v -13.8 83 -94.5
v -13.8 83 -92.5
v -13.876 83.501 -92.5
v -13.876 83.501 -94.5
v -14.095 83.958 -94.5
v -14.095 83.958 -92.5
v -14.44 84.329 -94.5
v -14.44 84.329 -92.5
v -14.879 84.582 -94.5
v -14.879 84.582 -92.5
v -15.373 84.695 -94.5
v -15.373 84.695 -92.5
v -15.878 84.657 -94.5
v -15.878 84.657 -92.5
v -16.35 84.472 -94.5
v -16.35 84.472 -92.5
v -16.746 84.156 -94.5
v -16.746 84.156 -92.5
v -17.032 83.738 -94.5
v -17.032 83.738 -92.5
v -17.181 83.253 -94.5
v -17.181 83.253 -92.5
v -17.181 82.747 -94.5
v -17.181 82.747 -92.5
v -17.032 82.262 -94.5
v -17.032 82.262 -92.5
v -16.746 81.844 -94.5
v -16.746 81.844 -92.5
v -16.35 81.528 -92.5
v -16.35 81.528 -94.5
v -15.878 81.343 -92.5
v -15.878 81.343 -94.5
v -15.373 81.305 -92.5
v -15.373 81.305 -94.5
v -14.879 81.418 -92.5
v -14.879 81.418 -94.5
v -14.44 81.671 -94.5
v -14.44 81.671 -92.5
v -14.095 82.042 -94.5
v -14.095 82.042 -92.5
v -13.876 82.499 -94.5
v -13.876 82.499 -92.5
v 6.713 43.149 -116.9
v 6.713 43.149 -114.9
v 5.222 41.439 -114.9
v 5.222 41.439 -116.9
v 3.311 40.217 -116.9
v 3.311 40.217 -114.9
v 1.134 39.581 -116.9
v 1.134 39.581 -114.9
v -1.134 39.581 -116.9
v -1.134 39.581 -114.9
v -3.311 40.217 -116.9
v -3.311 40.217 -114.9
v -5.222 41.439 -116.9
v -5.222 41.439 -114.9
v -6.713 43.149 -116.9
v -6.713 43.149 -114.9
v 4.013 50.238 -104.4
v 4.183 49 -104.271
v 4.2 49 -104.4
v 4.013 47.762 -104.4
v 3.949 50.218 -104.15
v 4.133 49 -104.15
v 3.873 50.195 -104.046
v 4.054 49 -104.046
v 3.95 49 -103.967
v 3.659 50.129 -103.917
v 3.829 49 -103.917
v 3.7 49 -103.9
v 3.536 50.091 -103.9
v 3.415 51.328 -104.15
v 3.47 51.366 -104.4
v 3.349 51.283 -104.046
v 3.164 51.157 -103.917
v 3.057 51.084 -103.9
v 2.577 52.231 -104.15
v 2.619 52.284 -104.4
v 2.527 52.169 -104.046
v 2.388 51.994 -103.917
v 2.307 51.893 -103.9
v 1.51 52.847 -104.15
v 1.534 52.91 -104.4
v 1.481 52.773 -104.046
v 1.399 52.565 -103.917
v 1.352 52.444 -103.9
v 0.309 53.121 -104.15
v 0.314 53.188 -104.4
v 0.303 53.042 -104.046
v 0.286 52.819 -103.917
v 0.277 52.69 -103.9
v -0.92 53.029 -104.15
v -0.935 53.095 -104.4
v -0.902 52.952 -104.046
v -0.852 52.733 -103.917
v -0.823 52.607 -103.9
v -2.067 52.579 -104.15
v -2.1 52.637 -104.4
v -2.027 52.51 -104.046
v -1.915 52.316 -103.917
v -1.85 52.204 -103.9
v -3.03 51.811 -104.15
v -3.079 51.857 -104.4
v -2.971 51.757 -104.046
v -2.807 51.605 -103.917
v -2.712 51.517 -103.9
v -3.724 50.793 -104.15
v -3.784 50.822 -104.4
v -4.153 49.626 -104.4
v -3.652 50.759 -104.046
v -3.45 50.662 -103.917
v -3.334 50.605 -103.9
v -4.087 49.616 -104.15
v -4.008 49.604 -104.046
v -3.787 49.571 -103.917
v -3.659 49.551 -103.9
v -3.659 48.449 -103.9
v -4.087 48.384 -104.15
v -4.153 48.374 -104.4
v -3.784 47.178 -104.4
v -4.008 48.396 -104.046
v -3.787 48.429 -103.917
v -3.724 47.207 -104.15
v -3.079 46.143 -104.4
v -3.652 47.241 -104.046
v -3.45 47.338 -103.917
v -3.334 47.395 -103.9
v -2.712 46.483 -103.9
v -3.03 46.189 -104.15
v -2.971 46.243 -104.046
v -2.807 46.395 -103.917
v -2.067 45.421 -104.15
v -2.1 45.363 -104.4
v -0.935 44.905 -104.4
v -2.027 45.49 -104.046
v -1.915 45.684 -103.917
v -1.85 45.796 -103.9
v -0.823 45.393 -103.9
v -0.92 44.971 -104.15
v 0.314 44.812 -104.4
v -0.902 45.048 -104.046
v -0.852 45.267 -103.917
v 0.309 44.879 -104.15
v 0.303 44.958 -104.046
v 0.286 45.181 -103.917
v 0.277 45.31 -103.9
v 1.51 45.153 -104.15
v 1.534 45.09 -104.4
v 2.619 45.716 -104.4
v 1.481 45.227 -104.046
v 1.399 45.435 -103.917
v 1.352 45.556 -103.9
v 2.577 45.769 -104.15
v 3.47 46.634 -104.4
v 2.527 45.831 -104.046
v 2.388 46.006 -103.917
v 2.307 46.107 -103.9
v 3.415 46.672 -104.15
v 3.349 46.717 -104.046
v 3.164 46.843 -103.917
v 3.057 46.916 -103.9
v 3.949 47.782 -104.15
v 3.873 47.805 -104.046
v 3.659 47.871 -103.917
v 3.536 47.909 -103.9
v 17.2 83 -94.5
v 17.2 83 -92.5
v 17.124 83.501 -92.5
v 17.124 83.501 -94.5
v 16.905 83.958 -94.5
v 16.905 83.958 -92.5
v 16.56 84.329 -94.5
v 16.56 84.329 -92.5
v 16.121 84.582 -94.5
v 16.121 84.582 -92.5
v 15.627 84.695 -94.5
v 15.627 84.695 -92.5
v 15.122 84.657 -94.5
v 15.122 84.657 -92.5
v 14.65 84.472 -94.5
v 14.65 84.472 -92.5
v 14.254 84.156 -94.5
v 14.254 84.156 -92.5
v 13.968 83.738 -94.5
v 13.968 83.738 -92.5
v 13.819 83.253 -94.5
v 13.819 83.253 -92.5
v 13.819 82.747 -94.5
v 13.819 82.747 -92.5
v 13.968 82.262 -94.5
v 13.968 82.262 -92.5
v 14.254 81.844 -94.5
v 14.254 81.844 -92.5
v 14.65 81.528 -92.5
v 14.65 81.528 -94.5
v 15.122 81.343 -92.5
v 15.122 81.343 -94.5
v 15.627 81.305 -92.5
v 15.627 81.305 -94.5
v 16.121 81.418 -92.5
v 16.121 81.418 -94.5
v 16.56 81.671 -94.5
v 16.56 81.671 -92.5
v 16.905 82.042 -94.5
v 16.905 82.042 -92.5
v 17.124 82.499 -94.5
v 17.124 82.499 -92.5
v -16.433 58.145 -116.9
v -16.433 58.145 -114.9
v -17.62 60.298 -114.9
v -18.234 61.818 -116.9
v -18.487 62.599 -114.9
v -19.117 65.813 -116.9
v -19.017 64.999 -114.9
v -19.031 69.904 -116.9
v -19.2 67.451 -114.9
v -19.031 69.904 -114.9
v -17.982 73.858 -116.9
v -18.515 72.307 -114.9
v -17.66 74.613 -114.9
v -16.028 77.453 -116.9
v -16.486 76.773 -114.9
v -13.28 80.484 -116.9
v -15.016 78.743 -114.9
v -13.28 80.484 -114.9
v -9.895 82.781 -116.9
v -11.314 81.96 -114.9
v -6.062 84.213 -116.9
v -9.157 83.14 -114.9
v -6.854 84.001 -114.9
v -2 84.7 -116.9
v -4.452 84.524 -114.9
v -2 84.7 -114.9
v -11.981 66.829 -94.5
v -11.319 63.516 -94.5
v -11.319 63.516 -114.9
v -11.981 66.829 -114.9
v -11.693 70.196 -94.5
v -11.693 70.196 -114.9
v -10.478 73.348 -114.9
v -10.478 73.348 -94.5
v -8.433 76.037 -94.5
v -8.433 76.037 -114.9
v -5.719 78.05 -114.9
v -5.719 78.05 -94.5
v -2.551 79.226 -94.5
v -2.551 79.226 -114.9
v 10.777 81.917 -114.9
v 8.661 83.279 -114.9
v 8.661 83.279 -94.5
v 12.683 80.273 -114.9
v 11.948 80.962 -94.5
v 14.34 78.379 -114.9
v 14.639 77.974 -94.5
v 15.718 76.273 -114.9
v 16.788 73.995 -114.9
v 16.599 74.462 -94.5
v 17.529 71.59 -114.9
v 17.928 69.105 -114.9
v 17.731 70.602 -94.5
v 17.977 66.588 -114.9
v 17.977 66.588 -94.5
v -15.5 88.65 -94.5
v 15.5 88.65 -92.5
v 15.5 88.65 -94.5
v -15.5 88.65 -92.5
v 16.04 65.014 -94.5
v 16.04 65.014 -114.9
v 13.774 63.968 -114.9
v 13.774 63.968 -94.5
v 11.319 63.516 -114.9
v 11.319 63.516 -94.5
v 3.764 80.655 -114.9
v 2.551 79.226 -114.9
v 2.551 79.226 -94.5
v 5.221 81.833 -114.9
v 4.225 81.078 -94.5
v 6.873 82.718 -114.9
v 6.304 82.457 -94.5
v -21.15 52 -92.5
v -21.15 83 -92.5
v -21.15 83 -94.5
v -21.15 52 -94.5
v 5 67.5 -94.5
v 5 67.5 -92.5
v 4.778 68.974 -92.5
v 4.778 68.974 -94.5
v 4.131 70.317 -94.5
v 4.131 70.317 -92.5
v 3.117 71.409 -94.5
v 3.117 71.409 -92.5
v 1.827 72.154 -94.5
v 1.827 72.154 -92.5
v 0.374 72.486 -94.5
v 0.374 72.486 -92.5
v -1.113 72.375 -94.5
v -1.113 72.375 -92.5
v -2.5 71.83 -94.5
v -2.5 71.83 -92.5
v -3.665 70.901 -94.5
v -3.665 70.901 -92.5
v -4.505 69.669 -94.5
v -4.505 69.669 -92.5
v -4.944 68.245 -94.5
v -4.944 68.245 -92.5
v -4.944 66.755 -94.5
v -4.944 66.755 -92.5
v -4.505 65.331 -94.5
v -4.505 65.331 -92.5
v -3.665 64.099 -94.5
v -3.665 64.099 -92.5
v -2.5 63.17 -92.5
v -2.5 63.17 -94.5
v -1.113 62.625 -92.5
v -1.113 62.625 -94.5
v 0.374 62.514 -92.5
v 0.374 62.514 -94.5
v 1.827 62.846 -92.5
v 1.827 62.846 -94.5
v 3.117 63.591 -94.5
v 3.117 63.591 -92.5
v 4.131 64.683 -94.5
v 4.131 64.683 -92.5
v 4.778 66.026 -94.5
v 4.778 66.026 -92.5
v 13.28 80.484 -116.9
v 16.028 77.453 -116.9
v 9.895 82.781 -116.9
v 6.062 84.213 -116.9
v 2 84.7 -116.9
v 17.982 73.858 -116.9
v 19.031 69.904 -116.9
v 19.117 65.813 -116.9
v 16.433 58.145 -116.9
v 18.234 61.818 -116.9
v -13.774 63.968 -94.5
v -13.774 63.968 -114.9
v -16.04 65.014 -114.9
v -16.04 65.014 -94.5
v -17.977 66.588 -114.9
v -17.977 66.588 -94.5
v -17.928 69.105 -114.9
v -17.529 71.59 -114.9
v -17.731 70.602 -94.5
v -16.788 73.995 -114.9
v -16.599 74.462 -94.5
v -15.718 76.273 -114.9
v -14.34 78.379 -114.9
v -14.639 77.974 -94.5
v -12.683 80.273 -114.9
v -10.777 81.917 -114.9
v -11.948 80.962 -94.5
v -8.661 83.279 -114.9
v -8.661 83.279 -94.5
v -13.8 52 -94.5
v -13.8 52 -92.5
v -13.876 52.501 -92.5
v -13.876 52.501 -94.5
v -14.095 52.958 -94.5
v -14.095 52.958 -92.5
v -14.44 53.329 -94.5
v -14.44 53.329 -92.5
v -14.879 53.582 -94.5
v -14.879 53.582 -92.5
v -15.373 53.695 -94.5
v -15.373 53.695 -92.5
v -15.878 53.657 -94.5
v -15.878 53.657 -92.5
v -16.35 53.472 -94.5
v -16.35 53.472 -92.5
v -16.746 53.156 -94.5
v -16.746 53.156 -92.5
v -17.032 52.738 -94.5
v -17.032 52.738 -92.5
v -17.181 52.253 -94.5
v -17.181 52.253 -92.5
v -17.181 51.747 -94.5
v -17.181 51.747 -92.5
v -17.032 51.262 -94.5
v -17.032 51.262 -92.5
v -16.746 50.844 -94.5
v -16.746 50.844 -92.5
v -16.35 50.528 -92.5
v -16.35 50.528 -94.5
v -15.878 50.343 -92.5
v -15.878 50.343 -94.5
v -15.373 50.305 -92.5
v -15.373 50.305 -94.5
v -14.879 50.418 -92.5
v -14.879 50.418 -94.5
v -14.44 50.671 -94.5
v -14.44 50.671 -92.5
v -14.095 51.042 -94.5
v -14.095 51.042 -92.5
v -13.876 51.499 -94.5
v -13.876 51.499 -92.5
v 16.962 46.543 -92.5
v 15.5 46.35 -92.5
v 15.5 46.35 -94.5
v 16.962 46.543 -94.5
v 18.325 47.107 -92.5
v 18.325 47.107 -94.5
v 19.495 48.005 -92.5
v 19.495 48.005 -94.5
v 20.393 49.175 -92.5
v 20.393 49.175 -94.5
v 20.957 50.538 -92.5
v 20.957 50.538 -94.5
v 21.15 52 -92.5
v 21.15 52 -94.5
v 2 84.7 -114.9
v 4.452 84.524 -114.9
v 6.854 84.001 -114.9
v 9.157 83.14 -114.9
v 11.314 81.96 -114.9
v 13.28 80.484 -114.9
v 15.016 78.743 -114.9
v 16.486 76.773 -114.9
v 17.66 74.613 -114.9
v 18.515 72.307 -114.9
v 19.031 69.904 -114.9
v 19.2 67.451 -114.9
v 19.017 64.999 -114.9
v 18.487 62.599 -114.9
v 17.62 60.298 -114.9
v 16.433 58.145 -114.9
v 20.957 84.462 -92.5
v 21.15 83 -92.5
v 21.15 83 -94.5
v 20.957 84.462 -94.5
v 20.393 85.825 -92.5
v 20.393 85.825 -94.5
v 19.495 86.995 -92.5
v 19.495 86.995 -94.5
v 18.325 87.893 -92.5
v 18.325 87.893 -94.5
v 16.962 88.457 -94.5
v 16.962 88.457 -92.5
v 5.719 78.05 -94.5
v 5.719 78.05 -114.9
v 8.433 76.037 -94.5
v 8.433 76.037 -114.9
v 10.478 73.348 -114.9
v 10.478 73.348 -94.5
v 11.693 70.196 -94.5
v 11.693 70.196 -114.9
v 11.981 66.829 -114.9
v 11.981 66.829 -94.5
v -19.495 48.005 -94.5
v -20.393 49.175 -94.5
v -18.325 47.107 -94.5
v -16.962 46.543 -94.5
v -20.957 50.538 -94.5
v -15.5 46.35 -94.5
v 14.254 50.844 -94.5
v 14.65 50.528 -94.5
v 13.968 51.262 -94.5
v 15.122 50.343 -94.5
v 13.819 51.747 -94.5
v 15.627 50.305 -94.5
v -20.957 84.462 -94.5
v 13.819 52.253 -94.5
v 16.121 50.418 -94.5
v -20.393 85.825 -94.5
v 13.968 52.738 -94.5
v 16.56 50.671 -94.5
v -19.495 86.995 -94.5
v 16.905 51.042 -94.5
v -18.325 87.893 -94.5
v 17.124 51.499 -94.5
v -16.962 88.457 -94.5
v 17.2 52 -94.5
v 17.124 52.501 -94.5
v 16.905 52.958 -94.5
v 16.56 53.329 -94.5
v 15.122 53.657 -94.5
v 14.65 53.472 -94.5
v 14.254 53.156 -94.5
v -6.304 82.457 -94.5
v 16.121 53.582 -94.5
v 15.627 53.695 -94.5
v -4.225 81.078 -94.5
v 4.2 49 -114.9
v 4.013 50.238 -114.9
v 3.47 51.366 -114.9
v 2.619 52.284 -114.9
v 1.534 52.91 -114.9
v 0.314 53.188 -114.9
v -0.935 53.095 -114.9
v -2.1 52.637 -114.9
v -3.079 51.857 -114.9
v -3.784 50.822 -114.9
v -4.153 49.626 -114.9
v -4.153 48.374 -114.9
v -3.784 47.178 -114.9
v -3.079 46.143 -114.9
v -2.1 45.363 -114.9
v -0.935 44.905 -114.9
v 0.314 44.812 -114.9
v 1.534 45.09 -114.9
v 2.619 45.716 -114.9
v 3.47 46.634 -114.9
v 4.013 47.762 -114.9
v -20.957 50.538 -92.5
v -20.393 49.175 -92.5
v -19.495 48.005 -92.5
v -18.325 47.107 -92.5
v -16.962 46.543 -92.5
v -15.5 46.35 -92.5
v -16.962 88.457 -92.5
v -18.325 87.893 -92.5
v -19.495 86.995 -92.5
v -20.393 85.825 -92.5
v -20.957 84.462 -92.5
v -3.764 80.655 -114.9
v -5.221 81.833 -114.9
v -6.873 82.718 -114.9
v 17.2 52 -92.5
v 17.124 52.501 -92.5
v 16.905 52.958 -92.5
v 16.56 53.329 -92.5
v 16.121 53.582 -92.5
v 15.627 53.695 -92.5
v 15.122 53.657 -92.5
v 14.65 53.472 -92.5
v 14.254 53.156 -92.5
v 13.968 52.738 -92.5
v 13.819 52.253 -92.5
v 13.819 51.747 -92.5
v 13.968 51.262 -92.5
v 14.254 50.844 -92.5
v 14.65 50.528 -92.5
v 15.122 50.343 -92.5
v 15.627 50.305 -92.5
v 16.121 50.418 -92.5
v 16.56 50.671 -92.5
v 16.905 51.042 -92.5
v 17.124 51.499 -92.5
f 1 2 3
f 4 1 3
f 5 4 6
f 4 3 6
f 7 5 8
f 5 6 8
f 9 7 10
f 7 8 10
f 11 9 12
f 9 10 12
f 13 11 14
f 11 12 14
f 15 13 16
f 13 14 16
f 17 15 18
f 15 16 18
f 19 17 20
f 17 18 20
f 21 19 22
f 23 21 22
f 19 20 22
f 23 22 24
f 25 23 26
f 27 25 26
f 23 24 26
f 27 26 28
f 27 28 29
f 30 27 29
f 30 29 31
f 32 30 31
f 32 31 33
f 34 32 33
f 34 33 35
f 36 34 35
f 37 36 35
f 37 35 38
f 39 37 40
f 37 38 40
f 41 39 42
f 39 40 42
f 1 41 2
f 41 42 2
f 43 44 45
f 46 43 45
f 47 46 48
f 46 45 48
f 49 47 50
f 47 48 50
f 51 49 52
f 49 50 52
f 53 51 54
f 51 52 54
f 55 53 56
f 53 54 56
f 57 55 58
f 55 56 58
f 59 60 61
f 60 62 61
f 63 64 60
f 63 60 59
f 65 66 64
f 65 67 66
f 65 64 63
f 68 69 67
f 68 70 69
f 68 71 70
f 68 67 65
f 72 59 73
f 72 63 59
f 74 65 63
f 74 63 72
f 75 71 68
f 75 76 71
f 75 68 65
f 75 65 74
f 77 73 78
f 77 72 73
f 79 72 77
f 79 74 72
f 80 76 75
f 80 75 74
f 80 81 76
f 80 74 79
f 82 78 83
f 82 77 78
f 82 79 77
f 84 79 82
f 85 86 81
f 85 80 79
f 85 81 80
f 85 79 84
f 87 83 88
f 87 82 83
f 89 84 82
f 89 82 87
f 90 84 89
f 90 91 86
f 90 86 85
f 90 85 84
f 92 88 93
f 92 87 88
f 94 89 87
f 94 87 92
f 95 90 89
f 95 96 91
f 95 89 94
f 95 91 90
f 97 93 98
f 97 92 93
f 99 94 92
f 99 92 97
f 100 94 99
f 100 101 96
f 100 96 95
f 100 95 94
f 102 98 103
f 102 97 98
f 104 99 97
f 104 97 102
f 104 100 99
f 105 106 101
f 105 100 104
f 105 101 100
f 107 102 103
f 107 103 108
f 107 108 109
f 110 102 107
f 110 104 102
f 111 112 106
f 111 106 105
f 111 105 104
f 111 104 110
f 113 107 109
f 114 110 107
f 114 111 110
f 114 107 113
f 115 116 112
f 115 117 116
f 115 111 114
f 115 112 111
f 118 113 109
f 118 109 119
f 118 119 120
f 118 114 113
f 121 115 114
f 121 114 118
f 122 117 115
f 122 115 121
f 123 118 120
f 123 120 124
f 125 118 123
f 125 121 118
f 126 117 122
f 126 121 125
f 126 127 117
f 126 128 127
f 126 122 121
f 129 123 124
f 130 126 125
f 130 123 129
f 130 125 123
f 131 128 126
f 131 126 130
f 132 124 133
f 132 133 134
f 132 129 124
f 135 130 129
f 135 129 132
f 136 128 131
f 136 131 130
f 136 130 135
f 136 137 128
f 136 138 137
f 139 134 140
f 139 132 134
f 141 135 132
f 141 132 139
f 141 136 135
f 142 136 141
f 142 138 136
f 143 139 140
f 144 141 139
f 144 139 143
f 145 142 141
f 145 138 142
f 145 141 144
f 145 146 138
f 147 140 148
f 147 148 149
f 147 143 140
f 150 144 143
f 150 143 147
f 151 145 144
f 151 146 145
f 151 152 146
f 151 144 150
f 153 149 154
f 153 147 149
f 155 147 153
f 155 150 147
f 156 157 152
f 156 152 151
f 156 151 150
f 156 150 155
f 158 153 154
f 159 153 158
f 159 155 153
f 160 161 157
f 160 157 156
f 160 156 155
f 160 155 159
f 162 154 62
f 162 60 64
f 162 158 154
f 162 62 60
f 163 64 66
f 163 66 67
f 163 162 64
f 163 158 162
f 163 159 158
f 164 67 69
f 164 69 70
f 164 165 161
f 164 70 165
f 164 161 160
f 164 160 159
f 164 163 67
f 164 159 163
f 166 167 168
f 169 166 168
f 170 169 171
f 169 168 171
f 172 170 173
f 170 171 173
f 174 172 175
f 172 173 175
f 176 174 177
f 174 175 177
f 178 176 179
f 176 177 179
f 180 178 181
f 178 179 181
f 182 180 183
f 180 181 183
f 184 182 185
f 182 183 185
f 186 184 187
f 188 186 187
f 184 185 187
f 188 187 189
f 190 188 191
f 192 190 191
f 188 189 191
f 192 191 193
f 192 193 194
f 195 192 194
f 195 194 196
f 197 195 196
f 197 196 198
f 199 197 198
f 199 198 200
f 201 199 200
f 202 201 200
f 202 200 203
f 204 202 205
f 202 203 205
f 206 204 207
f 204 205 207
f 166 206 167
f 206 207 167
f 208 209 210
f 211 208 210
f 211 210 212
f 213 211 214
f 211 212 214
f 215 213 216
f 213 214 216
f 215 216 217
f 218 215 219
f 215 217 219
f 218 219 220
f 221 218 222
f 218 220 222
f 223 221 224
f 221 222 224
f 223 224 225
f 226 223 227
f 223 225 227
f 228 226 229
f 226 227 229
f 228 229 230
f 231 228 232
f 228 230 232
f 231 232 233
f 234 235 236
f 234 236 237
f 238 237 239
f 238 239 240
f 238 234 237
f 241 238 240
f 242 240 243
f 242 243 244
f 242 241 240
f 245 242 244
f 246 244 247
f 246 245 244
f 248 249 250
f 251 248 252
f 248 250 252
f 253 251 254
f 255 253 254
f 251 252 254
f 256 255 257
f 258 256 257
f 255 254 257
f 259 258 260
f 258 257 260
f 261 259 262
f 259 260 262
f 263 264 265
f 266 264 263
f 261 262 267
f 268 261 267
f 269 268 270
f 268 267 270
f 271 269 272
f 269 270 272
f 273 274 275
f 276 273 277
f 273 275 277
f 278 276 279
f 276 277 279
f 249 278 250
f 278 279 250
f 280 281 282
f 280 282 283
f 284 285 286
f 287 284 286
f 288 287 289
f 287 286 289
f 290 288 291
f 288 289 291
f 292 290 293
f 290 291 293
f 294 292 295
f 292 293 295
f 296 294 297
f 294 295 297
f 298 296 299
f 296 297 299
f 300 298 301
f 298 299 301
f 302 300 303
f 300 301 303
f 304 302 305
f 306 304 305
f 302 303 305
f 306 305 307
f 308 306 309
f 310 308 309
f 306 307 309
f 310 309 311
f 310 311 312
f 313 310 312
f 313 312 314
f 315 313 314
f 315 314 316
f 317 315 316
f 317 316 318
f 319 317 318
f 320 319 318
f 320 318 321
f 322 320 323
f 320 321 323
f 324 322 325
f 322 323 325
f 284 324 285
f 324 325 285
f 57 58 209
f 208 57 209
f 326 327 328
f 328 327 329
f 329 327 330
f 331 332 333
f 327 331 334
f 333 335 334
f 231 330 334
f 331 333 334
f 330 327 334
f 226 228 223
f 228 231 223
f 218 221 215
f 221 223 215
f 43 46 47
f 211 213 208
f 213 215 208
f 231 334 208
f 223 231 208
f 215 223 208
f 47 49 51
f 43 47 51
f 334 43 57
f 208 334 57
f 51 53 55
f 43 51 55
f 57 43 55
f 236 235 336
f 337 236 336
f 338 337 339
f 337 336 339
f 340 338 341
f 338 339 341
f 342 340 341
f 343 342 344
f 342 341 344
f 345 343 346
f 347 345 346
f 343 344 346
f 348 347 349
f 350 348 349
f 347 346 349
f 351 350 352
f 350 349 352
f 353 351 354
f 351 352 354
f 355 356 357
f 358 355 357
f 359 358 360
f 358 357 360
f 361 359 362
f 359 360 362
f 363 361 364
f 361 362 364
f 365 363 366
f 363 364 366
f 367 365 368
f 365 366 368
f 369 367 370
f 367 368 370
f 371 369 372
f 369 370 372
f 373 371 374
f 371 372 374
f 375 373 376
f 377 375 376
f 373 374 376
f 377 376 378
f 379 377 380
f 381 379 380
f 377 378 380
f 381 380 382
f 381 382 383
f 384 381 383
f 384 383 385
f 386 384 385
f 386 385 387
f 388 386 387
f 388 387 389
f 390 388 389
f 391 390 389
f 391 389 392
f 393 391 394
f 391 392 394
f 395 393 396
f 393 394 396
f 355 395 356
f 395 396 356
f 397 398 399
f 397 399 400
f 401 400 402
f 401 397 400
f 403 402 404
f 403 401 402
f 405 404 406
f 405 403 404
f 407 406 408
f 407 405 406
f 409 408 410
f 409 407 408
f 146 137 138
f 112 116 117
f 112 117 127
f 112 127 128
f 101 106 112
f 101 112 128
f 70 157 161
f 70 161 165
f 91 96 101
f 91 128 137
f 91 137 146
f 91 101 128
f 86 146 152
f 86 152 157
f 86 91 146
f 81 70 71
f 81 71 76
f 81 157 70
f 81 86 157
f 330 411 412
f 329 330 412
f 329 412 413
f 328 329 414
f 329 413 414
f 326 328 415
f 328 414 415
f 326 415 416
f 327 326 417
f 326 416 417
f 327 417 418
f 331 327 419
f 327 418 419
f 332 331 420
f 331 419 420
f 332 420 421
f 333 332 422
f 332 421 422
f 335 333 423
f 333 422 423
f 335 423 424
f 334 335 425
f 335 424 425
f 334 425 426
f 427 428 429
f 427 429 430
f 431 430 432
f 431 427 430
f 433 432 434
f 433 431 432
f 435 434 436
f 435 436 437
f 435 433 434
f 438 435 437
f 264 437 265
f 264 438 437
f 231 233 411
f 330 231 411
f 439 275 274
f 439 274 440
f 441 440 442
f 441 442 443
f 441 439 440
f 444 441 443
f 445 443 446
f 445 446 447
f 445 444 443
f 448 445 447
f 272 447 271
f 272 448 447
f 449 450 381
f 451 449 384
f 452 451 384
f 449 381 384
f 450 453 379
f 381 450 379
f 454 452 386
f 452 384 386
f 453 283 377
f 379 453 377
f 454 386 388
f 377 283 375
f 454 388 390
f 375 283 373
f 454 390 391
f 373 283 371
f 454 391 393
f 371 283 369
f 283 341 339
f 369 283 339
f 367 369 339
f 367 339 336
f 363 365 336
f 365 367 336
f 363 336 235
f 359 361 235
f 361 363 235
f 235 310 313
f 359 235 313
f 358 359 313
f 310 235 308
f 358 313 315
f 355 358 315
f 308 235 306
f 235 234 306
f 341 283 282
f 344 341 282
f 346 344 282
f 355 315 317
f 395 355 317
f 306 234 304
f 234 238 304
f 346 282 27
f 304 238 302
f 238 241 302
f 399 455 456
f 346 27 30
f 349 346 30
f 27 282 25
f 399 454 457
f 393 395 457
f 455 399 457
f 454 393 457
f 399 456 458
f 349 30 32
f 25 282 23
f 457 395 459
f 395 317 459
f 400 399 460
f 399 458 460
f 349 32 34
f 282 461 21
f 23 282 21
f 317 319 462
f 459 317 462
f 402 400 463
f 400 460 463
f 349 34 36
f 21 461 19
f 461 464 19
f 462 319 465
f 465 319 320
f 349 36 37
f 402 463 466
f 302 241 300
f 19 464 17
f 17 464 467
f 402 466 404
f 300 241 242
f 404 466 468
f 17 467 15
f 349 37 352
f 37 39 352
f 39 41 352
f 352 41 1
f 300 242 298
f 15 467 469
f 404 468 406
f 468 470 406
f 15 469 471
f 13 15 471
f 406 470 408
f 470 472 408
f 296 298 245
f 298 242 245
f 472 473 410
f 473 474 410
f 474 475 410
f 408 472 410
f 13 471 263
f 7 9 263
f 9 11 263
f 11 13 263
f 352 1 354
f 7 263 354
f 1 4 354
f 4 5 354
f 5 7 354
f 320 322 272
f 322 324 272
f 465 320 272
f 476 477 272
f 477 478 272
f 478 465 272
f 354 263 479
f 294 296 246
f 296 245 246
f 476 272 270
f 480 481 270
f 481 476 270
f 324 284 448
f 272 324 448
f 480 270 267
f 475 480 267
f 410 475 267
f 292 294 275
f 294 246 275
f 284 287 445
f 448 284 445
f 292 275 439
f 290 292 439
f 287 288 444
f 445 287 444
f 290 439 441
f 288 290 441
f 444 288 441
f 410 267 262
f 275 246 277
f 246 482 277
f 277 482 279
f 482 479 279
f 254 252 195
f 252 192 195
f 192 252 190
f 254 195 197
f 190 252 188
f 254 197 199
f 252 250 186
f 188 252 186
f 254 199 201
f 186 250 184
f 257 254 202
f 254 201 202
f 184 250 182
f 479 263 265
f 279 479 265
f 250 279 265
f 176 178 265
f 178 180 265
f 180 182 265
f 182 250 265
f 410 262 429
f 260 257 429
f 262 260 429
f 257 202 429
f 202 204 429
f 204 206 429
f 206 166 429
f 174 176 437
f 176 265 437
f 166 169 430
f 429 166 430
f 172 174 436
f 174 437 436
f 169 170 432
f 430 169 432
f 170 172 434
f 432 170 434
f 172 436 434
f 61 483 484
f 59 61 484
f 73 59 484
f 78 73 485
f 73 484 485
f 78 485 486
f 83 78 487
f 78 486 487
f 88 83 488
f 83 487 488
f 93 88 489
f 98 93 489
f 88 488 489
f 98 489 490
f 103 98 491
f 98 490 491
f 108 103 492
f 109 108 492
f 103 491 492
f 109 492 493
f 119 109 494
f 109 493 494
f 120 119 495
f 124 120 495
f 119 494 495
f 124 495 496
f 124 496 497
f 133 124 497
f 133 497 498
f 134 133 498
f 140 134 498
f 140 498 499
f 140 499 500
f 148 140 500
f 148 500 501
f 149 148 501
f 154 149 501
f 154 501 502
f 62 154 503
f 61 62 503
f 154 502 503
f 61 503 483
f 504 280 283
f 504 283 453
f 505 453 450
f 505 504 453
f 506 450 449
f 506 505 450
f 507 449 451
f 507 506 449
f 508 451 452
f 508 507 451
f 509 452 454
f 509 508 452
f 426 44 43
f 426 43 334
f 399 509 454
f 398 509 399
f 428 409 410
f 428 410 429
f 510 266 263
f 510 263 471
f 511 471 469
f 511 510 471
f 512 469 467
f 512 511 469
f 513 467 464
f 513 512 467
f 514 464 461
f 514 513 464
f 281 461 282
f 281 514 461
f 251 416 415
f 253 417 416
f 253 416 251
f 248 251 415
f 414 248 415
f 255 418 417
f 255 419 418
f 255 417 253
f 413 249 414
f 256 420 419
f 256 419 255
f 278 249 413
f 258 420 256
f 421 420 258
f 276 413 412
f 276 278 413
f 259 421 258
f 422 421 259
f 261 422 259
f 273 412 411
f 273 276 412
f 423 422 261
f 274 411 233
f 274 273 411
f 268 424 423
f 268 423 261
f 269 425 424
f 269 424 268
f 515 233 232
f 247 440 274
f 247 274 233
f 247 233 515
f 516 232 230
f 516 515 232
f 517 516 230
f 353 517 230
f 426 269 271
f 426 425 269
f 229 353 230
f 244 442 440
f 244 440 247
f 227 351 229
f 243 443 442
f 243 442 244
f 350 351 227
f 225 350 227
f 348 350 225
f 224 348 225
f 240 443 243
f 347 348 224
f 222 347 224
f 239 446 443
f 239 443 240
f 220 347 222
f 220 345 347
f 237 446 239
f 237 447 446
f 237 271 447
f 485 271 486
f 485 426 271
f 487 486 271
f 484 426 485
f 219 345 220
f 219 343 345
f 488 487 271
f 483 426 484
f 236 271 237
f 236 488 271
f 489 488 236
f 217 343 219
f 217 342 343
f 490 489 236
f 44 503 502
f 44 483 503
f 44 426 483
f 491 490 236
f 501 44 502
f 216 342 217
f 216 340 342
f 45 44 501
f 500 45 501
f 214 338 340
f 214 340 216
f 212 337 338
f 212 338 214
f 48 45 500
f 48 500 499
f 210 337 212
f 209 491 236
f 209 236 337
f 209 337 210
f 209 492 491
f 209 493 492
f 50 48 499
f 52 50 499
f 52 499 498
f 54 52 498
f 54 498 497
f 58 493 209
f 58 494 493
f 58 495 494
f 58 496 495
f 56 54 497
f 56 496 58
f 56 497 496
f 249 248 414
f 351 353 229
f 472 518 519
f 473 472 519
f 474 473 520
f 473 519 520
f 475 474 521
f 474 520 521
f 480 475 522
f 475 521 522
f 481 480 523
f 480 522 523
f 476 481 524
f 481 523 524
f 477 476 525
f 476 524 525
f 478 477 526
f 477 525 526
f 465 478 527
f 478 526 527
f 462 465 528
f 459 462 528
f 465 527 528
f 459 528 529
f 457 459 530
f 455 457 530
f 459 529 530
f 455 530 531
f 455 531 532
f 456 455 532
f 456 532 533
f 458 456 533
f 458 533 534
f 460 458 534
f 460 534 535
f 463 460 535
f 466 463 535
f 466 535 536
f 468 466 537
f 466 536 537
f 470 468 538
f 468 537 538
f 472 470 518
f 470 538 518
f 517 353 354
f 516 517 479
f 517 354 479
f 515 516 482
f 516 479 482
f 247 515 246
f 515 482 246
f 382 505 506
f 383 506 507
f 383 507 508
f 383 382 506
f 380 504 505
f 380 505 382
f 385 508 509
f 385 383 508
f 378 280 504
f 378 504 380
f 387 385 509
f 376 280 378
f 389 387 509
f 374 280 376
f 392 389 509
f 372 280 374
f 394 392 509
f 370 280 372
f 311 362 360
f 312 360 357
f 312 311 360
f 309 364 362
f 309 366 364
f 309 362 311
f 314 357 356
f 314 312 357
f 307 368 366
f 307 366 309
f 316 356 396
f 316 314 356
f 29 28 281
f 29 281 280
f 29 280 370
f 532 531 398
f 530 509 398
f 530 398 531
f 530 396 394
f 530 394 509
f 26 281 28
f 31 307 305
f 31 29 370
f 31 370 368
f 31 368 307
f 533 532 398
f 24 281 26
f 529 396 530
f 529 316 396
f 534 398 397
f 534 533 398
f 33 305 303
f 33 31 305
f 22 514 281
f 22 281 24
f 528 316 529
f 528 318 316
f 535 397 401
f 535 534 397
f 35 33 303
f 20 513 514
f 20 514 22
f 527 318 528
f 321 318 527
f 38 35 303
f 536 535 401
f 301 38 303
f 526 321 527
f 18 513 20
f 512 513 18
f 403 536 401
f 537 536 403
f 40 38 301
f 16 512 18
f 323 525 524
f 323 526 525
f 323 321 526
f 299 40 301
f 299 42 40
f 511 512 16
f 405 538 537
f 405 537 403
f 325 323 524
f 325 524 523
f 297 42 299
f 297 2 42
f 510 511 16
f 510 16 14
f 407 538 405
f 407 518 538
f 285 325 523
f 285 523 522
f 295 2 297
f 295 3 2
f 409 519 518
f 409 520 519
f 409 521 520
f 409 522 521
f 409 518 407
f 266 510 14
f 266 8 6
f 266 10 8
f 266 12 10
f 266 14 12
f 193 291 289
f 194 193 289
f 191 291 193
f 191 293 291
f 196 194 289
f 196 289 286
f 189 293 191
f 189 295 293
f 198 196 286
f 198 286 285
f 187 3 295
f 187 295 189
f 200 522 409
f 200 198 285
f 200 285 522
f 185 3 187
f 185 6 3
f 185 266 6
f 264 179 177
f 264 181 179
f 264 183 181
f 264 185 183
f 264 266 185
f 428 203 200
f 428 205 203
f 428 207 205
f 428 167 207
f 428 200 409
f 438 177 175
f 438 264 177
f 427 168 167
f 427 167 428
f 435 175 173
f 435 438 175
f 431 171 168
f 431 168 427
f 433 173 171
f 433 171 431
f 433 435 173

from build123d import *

# Parameters (mm, degrees)
SKETCH097_R   = 1.7
SKETCH097_R_2 = 5
PAD047_DEPTH  = 2
PAD048_DEPTH  = 20.4
PAD049_DEPTH  = 2
SKETCH100_R   = 4.2
PAD050_DEPTH  = 11
FILLET006_R   = 0.5


with BuildPart() as part:
    # Sketch097 → Pad047 (new body)
    with BuildSketch(Plane.XY):
        with BuildLine():
            ThreePointArc((-15.5, 21.15), (-19.495153, 19.495153), (-21.15, 15.5))
            Line((-21.15, 15.5), (-21.15, -15.5))
            ThreePointArc((-21.15, -15.5), (-19.495153, -19.495153), (-15.5, -21.15))
            Line((-15.5, -21.15), (15.5, -21.15))
            ThreePointArc((15.5, -21.15), (19.495153, -19.495153), (21.15, -15.5))
            Line((21.15, -15.5), (21.15, 15.500001))
            ThreePointArc((21.15, 15.500001), (19.495153, 19.495154), (15.5, 21.15))
            Line((15.5, 21.15), (-15.5, 21.15))
        make_face()
        with Locations((-15.5, 15.5)):
            Circle(SKETCH097_R, mode=Mode.SUBTRACT)
        with Locations((15.5, 15.5)):
            Circle(SKETCH097_R, mode=Mode.SUBTRACT)
        with Locations((15.5, -15.5)):
            Circle(SKETCH097_R, mode=Mode.SUBTRACT)
        with Locations((-15.5, -15.5)):
            Circle(SKETCH097_R, mode=Mode.SUBTRACT)
        Circle(SKETCH097_R_2, mode=Mode.SUBTRACT)
    extrude(amount=-PAD047_DEPTH)

    # Sketch098 (on Face15 of Pad047) → Pad048 (join)
    with BuildSketch(Plane(origin=(0, 0, -2), x_dir=(1, 0, 0), z_dir=(0, 0, -1))):
        with BuildLine():
            ThreePointArc((-11.319432, 3.983774), (-10.478372, -5.848394), (-2.551393, -11.72563))
            ThreePointArc((-8.66094, -15.779357), (-5.221239, -14.332635), (-2.551393, -11.72563))
            ThreePointArc((-17.976895, 0.911728), (-15.717559, -8.772591), (-8.66094, -15.779357))
            ThreePointArc((-11.319432, 3.983774), (-14.939874, 3.07992), (-17.976895, 0.911728))
        make_face()
        with BuildLine():
            ThreePointArc((2.551393, -11.72563), (5.221239, -14.332635), (8.66094, -15.779357))
            ThreePointArc((8.66094, -15.779357), (15.717559, -8.772591), (17.976895, 0.911728))
            ThreePointArc((17.976895, 0.911728), (14.939874, 3.07992), (11.319432, 3.983774))
            ThreePointArc((2.551393, -11.72563), (10.478372, -5.848394), (11.319432, 3.983774))
        make_face()
    extrude(amount=PAD048_DEPTH)

    # Sketch099 (on Face25 of Pad048) → Pad049 (join)
    with BuildSketch(Plane(origin=(0, 0, -22.4), x_dir=(1, 0, 0), z_dir=(0, 0, -1))):
        with BuildLine():
            Line((6.713127, 24.351313), (16.433224, 9.355322))
            ThreePointArc((2, -17.2), (17.112107, -8.213661), (16.433224, 9.355322))
            Line((-2, -17.2), (2, -17.2))
            ThreePointArc((-16.433224, 9.355322), (-17.112107, -8.213661), (-2, -17.2))
            Line((-6.713127, 24.351313), (-16.433224, 9.355322))
            ThreePointArc((6.713127, 24.351313), (0, 28), (-6.713127, 24.351313))
        make_face()
    extrude(amount=PAD049_DEPTH)

    # Sketch100 (on Face4 of Pad049) → Pad050 (join)
    with BuildSketch(Plane.XY.offset(-22.4)):
        with Locations((0, -18.5)):
            Circle(SKETCH100_R)
    extrude(amount=PAD050_DEPTH)

    # Fillet006
    fillet006_edges = [part.edges().sort_by_distance(p)[0] for p in [
        (-4.2, -18.5, -11.4),
    ]]
    fillet(fillet006_edges, radius=FILLET006_R)


with BuildPart() as part_1:
    # Body022 placement: moved
    add(part.part.moved(Location((0, 67.5, -92.5))))


solid = part_1.part
